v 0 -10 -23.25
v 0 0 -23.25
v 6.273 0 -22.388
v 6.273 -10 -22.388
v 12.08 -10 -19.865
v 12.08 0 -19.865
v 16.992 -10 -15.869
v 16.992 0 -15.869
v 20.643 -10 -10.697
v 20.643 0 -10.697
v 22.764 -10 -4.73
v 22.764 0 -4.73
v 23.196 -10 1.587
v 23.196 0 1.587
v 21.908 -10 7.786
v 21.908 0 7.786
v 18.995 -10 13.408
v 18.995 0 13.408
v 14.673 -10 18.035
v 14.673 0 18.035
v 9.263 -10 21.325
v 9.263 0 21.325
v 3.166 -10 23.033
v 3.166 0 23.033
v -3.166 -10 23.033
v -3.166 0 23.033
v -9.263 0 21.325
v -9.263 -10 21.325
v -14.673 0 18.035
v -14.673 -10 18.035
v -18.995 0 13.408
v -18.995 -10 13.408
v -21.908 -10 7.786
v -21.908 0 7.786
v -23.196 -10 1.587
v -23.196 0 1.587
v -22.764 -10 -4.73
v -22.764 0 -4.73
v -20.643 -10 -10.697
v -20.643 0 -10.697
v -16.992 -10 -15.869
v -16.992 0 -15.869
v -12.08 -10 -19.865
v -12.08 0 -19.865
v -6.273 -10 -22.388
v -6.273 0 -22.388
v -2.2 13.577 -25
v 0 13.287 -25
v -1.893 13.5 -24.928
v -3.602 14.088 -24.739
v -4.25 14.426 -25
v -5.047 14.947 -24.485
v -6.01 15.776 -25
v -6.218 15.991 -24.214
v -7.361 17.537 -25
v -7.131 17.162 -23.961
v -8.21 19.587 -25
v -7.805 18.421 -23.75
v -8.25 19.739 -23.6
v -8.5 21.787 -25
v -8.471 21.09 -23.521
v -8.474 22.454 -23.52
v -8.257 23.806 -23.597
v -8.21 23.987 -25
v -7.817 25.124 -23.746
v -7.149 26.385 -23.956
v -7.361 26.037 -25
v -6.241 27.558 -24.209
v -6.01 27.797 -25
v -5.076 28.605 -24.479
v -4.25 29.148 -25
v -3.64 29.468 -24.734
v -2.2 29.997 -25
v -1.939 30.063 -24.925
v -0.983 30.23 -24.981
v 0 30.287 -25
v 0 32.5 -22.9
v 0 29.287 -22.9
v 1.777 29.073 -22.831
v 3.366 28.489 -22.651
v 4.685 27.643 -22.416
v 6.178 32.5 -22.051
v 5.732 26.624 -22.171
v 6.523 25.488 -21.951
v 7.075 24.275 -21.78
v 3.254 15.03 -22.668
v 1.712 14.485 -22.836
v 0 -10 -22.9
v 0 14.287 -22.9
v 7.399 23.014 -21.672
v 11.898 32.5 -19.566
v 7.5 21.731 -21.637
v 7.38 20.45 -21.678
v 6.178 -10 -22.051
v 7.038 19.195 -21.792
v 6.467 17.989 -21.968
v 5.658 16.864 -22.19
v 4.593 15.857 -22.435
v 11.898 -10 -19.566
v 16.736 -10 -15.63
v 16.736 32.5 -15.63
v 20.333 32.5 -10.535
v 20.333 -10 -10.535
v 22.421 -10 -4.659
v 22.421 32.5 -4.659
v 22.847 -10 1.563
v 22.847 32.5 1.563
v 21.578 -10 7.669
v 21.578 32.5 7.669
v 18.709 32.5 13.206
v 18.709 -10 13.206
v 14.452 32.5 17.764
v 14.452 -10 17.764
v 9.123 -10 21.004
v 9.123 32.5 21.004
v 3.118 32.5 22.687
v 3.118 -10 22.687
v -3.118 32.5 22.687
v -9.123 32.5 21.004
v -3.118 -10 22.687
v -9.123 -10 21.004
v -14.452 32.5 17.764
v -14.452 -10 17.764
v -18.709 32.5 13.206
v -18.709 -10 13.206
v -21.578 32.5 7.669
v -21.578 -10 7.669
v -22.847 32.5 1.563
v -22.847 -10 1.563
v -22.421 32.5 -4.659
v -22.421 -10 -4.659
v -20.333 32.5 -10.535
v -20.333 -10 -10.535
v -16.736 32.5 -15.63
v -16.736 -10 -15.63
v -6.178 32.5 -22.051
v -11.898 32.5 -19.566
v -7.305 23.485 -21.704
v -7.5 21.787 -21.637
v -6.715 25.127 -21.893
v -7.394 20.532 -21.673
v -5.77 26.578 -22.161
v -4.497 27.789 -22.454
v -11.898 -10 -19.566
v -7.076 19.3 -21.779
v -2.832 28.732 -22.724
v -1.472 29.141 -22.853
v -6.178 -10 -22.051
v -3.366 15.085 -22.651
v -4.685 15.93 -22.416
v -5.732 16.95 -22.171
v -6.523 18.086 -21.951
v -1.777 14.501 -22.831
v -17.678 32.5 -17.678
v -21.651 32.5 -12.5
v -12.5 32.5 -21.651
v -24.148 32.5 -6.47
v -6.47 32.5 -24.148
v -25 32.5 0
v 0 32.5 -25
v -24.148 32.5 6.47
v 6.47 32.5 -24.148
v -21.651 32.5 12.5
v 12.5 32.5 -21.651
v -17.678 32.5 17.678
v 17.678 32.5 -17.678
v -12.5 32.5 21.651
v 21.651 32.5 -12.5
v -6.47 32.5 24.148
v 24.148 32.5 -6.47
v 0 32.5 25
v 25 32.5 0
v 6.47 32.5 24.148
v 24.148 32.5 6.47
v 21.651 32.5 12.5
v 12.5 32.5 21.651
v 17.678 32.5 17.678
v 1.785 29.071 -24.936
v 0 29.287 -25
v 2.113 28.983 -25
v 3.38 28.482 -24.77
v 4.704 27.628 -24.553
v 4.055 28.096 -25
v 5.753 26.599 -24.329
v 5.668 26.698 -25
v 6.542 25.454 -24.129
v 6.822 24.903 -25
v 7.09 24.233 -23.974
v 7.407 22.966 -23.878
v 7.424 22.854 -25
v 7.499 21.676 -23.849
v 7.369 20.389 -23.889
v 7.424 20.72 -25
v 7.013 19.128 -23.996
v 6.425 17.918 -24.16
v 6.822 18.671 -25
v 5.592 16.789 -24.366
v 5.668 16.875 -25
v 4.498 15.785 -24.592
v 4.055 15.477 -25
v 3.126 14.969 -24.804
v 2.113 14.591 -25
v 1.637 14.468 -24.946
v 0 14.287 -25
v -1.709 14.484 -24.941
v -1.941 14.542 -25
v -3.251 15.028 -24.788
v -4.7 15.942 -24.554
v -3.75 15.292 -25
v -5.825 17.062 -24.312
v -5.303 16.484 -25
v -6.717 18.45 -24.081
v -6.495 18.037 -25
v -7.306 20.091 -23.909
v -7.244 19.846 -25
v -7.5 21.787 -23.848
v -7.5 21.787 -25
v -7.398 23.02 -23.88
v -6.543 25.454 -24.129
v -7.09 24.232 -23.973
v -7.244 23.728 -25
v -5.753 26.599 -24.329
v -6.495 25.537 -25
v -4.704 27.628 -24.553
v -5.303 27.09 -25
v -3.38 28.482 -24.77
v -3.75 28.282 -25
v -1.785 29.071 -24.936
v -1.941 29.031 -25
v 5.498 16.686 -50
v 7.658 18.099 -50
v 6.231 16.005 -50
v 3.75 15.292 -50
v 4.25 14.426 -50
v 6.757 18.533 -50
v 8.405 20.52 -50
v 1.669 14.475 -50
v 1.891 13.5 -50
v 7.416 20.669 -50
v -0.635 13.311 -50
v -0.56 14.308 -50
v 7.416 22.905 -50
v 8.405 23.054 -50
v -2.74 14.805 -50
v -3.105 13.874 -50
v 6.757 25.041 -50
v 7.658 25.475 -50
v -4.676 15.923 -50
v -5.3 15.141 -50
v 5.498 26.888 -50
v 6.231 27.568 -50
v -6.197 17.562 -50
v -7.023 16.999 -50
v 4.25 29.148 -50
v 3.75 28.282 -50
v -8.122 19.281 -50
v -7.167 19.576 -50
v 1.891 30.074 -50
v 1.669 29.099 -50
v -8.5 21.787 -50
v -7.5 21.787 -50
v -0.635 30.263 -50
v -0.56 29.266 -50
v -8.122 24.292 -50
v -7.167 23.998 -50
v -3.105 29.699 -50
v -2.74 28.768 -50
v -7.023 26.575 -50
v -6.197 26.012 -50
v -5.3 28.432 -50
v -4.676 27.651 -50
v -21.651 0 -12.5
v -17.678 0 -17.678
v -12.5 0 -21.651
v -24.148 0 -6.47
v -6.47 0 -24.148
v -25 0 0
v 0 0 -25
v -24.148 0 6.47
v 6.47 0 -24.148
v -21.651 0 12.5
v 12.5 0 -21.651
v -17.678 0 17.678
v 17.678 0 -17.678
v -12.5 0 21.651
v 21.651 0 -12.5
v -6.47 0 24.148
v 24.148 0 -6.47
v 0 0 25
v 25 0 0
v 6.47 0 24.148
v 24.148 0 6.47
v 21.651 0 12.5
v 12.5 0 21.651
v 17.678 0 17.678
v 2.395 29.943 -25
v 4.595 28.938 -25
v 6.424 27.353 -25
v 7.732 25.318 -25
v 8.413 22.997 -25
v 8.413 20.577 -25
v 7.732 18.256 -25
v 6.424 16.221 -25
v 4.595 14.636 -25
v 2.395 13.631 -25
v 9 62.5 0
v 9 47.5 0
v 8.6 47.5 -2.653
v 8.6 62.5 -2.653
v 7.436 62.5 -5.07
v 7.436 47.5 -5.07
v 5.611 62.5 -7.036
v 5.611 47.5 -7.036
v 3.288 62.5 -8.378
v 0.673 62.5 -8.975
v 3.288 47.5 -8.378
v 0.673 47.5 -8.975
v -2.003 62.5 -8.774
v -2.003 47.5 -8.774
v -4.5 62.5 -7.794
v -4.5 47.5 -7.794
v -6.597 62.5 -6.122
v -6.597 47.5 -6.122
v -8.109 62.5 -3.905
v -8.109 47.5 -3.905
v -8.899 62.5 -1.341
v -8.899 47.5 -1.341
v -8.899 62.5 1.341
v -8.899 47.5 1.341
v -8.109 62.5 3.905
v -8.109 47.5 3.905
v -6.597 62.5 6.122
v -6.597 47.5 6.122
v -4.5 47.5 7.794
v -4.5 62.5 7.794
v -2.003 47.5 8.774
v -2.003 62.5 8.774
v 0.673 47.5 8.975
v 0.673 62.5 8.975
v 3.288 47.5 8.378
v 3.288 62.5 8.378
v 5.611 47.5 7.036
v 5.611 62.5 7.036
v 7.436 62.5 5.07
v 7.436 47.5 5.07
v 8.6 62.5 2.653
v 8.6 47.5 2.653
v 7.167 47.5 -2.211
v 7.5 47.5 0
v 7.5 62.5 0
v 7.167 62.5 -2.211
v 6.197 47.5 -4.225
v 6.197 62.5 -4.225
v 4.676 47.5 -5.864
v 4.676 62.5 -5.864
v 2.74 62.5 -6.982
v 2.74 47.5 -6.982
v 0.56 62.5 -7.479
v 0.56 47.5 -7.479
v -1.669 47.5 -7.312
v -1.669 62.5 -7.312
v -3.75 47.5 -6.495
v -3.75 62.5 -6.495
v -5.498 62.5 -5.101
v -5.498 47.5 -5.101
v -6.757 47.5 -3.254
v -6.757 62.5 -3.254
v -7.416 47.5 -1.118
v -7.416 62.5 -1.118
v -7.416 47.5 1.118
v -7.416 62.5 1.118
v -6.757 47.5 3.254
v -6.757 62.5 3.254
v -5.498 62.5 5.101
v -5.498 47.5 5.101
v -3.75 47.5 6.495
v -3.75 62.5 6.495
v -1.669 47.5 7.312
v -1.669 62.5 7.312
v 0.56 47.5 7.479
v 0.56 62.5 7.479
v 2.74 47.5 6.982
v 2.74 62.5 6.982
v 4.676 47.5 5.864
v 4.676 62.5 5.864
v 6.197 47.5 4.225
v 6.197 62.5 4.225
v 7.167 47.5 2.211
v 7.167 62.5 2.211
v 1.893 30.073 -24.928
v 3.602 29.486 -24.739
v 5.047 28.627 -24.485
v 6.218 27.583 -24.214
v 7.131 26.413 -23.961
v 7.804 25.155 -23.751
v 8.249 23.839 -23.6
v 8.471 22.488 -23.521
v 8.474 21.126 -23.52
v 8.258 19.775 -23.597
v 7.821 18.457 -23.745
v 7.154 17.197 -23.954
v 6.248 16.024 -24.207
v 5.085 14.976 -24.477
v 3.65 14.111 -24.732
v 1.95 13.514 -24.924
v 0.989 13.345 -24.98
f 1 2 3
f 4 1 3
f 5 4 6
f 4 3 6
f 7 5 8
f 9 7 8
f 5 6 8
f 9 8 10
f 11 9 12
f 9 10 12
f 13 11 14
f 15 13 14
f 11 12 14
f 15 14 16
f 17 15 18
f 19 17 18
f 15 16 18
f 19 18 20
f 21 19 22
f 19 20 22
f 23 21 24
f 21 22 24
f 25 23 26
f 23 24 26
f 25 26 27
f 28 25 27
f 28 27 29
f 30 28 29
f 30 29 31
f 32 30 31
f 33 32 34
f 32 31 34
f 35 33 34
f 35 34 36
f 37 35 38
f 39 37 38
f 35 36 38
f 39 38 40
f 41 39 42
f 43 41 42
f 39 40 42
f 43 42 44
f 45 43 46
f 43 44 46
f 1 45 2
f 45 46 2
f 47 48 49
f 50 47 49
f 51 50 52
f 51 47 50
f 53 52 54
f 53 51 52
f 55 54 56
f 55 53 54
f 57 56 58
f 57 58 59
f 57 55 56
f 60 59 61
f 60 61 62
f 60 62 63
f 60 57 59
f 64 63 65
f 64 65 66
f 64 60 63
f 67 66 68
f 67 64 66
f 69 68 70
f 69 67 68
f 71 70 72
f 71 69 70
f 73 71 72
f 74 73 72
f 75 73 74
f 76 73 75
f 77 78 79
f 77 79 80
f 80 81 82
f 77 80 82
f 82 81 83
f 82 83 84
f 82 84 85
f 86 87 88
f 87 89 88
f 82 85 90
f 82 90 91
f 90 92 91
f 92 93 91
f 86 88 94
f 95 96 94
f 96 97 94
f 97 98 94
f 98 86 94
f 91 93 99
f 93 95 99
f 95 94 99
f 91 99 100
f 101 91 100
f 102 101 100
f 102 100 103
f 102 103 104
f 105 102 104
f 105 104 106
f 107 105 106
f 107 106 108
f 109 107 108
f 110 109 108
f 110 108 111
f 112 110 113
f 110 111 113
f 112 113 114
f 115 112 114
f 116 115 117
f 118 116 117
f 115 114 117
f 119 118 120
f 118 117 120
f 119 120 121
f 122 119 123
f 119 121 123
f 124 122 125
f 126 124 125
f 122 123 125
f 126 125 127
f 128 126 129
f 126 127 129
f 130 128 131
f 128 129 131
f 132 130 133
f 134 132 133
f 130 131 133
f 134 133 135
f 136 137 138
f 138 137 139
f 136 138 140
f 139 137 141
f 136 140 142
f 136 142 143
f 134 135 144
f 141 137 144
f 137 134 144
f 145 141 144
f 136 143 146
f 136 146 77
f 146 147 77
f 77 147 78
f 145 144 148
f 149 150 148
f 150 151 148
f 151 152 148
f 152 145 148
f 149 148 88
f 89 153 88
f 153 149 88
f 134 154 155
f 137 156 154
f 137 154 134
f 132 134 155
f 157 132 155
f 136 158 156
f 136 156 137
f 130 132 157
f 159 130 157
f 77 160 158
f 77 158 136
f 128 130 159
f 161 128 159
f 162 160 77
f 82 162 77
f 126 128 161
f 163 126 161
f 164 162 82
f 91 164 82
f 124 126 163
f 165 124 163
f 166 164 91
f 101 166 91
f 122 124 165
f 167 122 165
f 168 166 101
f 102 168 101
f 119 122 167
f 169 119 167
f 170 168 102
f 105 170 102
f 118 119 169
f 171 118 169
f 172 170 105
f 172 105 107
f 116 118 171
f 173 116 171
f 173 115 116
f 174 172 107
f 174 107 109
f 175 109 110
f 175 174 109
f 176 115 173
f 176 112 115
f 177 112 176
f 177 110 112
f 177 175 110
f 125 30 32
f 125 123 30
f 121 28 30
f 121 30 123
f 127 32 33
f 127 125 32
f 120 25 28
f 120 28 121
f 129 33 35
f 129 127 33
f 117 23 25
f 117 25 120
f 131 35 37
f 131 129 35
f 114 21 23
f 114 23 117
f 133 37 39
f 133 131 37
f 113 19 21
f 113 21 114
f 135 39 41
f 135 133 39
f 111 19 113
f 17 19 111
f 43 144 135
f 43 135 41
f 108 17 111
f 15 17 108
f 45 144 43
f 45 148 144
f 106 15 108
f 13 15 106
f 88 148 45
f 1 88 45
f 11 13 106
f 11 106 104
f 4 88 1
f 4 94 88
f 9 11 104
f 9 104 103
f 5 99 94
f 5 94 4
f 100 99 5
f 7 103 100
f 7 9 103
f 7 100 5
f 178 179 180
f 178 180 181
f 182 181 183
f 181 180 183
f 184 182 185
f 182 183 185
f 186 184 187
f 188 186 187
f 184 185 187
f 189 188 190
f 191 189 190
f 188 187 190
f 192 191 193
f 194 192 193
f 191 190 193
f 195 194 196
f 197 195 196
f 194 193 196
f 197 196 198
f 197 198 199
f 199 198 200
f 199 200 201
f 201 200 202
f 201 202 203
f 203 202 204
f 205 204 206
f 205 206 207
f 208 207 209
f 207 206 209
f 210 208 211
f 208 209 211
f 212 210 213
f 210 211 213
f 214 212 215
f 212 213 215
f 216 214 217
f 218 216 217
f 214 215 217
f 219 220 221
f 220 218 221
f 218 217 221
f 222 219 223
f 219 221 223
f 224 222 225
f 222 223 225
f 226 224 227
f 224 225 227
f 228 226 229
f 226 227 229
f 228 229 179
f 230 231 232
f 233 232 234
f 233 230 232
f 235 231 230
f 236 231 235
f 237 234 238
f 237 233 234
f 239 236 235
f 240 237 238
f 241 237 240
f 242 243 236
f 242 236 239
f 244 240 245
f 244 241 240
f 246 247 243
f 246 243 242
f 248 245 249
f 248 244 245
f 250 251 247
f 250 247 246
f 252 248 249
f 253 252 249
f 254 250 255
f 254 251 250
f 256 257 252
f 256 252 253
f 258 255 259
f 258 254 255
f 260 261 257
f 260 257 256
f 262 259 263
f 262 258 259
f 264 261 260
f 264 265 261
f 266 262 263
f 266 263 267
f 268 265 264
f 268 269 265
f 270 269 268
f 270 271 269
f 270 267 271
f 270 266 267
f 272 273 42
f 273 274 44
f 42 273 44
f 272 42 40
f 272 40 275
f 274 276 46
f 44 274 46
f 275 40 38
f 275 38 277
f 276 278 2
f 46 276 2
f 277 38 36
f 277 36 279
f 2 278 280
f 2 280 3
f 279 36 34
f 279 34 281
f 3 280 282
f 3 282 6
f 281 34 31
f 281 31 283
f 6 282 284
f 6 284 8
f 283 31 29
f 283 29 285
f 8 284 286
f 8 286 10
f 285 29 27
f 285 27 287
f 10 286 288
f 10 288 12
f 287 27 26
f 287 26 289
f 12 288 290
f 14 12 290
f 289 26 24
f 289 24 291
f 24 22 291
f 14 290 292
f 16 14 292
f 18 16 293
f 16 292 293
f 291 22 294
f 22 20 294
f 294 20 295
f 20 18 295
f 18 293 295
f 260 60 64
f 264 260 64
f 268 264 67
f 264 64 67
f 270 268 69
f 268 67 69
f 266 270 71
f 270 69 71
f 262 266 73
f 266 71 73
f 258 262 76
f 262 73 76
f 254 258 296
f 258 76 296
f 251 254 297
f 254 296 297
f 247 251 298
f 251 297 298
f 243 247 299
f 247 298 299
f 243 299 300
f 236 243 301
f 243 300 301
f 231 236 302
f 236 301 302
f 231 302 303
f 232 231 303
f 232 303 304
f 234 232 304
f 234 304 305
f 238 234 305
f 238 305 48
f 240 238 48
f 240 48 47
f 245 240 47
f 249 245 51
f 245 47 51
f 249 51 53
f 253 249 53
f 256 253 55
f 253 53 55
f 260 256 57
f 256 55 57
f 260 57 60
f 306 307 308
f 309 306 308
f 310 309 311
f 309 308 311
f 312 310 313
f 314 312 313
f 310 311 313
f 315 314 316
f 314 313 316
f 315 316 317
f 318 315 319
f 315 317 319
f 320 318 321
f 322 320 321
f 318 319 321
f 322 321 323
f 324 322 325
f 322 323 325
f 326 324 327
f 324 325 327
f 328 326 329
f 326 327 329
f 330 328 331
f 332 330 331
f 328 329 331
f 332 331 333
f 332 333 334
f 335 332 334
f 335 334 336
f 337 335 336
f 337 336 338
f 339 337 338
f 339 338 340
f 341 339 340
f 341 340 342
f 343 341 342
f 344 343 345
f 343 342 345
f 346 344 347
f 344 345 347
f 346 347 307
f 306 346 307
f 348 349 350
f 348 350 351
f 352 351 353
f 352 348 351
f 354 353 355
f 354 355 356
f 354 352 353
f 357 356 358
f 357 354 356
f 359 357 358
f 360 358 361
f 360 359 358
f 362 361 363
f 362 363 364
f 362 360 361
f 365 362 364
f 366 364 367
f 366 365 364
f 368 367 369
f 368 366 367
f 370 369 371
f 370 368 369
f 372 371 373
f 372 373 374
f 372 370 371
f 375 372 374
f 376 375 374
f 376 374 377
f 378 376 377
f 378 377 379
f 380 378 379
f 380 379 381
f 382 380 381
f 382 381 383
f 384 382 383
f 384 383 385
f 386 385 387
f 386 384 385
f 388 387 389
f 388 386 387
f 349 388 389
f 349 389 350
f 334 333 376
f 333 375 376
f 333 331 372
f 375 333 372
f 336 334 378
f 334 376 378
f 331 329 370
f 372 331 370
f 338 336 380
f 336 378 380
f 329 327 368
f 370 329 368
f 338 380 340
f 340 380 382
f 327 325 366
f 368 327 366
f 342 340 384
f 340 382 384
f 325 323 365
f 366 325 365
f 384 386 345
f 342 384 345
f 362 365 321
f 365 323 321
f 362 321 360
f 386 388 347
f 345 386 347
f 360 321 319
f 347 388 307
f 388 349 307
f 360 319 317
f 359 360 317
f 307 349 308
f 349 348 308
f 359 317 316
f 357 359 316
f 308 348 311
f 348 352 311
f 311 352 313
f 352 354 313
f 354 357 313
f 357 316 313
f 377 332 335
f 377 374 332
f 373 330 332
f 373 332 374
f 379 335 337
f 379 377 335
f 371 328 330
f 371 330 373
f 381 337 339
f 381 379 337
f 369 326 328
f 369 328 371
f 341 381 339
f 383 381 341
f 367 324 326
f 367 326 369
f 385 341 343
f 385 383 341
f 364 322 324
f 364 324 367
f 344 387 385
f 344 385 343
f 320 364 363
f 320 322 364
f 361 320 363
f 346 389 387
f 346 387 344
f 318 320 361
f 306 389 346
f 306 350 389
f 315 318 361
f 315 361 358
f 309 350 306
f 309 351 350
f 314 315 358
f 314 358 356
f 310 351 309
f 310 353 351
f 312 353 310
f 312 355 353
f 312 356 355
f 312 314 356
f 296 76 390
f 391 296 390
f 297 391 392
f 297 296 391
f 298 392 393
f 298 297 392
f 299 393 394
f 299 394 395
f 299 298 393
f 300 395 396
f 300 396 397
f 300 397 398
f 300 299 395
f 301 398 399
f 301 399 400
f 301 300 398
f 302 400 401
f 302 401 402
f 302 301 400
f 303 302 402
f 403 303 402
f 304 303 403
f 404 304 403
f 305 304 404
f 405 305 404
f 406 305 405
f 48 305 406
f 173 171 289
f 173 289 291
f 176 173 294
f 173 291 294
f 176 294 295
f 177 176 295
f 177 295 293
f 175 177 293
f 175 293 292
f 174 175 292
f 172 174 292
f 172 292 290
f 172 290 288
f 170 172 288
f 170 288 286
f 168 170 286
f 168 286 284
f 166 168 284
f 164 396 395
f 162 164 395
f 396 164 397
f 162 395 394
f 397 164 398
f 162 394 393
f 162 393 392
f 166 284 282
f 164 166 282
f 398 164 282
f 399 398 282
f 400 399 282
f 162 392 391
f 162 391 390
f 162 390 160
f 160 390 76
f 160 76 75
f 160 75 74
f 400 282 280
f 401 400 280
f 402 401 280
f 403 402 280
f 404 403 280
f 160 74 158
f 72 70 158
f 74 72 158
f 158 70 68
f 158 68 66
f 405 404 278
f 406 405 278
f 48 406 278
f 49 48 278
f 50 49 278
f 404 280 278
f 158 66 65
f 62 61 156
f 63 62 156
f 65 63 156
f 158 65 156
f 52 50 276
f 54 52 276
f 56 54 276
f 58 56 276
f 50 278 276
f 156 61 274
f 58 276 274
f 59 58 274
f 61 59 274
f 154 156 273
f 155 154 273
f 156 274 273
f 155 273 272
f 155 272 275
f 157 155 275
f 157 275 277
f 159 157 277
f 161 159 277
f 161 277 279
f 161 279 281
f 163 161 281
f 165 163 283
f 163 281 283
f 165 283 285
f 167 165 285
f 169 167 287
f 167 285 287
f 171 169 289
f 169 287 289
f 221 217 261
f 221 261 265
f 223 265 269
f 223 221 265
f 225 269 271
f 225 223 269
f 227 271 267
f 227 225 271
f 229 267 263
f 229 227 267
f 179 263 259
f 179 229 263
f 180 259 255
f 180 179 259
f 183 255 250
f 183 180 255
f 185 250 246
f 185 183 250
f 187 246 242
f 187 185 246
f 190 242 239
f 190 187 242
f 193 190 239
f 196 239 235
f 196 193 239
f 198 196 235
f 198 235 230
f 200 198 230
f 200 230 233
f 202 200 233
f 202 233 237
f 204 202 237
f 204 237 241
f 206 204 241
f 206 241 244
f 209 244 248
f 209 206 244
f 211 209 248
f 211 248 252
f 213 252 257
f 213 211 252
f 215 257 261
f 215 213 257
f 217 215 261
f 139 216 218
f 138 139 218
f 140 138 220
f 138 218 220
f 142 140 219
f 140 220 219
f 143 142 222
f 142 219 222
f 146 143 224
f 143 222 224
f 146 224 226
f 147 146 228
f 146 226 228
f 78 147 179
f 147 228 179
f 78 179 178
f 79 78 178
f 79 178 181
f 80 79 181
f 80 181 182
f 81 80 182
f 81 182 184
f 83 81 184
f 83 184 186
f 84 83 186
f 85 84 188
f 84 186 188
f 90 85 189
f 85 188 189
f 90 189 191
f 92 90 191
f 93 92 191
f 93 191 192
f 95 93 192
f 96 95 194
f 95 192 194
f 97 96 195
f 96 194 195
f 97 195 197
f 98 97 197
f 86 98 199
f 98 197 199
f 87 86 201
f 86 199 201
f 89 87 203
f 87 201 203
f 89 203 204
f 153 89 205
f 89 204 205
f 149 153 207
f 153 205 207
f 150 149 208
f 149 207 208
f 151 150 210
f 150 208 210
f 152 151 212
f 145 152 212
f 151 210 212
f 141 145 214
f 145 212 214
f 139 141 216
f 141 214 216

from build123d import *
from build123d.topology import SkipClean

# Parameters (mm, degrees)
SKETCH2_R                       = 25
BOSS_EXTRUDE1_DEPTH             = 32.5
SKETCH3_R                       = 23.25
BOSS_EXTRUDE2_DEPTH             = 10
SKETCH4_R                       = 22.9
CUT_EXTRUDE1_DEPTH              = 56.283360969
SKETCH5_R                       = 9
SKETCH5_R_2                     = 7.5
EXTRUDE_THIN1_DEPTH             = 15
CUT_EXTRUDE2_REACH              = 85.853
CUT_EXTRUDE2_END_RADIUS         = 22.9
SKETCH6_R                       = 7.5
EXTRUDE_THIN4_REACH             = 85.853
EXTRUDE_THIN4_END_RADIUS        = 25
SKETCH6_3_R                     = 8.5
SKETCH6_3_R_2                   = 7.5
EXTRUDE_THIN4_DIRECTION_2_DEPTH = 25


with BuildPart() as part:
    # Sketch2 → Boss-Extrude1 (new body)
    with BuildSketch(Plane(origin=(0, 0, 0), x_dir=(1, 0, 0), z_dir=(0, 1, 0))):
        with Locations(Location((0, 0, 0), (0, 0, 270))):
            Circle(SKETCH2_R)
    extrude(amount=BOSS_EXTRUDE1_DEPTH)

    # Sketch3 → Boss-Extrude2 (add)
    with BuildSketch(Plane.XZ):
        with Locations(Location((0, 0, 0), (0, 0, 270))):
            Circle(SKETCH3_R)
    extrude(amount=BOSS_EXTRUDE2_DEPTH)

    # Sketch4 → Cut-Extrude1 (cut, through all)
    with BuildSketch(Plane.XZ.offset(10)):
        with Locations(Location((0, 0, 0), (0, 0, 270))):
            Circle(SKETCH4_R)
    extrude(amount=-CUT_EXTRUDE1_DEPTH, mode=Mode.SUBTRACT)

    # Cut-Extrude2: up to this cylinder (the profile starts outside it)
    cut_extrude2_end = Plane(origin=(0, 21.786891, 0), z_dir=(0, -1, 0)) * Cylinder(CUT_EXTRUDE2_END_RADIUS, 218.506, mode=Mode.PRIVATE)
    # Sketch6 → Cut-Extrude2 (cut, up to the surface)
    with BuildSketch(Plane(origin=(0, 0, -25), x_dir=(-1, 0, 0), z_dir=(0, 0, -1)), mode=Mode.PRIVATE) as cut_extrude2_sk1:
        with Locations((0, 21.7868914)):
            Circle(SKETCH6_R)
    cut_extrude2_tool1 = extrude(cut_extrude2_sk1.sketch, amount=-CUT_EXTRUDE2_REACH, mode=Mode.PRIVATE) - cut_extrude2_end
    add(cut_extrude2_tool1.solids().sort_by_distance((0, 21.786891, -25))[0], mode=Mode.SUBTRACT)

    # Extrude-Thin4: up to this cylinder (the profile starts outside it)
    extrude_thin4_end = Plane(origin=(0, 21.786891, 0), z_dir=(0, -1, 0)) * Cylinder(EXTRUDE_THIN4_END_RADIUS, 222.706, mode=Mode.PRIVATE)
    # Sketch6<3> → Extrude-Thin4 (add, up to the surface)
    with BuildSketch(Plane(origin=(0, 0, -25), x_dir=(-1, 0, 0), z_dir=(0, 0, -1)), mode=Mode.PRIVATE) as extrude_thin4_sk1:
        with Locations((0, 21.7868914)):
            Circle(SKETCH6_3_R)
        with Locations((0, 21.7868914)):
            Circle(SKETCH6_3_R_2, mode=Mode.SUBTRACT)
    extrude_thin4_tool1 = extrude(extrude_thin4_sk1.sketch, amount=-EXTRUDE_THIN4_REACH, mode=Mode.PRIVATE) - extrude_thin4_end
    add(extrude_thin4_tool1.solids().sort_by_distance((8.259584, 21.786891, -25))[0])
    add(extrude_thin4_tool1.solids().sort_by_distance((8.259584, 21.786891, -25))[1])

    # Sketch6<3> → Extrude-Thin4 direction 2 (add)
    with SkipClean():  # the faces are left unmerged after this step: merging them gives an invalid solid
        with BuildSketch(Plane(origin=(0, 0, -25), x_dir=(-1, 0, 0), z_dir=(0, 0, -1))):
            with Locations((0, 21.7868914)):
                Circle(SKETCH6_3_R)
            with Locations((0, 21.7868914)):
                Circle(SKETCH6_3_R_2, mode=Mode.SUBTRACT)
        extrude(amount=EXTRUDE_THIN4_DIRECTION_2_DEPTH)


with BuildPart() as body_2:
    # Sketch5 → Extrude-Thin1 (new body)
    with BuildSketch(Plane(origin=(0, 47.5, 0), x_dir=(1, 0, 0), z_dir=(0, 1, 0))):
        Circle(SKETCH5_R)
        Circle(SKETCH5_R_2, mode=Mode.SUBTRACT)
    extrude(amount=EXTRUDE_THIN1_DEPTH)


solid = Compound([part.part, body_2.part])
